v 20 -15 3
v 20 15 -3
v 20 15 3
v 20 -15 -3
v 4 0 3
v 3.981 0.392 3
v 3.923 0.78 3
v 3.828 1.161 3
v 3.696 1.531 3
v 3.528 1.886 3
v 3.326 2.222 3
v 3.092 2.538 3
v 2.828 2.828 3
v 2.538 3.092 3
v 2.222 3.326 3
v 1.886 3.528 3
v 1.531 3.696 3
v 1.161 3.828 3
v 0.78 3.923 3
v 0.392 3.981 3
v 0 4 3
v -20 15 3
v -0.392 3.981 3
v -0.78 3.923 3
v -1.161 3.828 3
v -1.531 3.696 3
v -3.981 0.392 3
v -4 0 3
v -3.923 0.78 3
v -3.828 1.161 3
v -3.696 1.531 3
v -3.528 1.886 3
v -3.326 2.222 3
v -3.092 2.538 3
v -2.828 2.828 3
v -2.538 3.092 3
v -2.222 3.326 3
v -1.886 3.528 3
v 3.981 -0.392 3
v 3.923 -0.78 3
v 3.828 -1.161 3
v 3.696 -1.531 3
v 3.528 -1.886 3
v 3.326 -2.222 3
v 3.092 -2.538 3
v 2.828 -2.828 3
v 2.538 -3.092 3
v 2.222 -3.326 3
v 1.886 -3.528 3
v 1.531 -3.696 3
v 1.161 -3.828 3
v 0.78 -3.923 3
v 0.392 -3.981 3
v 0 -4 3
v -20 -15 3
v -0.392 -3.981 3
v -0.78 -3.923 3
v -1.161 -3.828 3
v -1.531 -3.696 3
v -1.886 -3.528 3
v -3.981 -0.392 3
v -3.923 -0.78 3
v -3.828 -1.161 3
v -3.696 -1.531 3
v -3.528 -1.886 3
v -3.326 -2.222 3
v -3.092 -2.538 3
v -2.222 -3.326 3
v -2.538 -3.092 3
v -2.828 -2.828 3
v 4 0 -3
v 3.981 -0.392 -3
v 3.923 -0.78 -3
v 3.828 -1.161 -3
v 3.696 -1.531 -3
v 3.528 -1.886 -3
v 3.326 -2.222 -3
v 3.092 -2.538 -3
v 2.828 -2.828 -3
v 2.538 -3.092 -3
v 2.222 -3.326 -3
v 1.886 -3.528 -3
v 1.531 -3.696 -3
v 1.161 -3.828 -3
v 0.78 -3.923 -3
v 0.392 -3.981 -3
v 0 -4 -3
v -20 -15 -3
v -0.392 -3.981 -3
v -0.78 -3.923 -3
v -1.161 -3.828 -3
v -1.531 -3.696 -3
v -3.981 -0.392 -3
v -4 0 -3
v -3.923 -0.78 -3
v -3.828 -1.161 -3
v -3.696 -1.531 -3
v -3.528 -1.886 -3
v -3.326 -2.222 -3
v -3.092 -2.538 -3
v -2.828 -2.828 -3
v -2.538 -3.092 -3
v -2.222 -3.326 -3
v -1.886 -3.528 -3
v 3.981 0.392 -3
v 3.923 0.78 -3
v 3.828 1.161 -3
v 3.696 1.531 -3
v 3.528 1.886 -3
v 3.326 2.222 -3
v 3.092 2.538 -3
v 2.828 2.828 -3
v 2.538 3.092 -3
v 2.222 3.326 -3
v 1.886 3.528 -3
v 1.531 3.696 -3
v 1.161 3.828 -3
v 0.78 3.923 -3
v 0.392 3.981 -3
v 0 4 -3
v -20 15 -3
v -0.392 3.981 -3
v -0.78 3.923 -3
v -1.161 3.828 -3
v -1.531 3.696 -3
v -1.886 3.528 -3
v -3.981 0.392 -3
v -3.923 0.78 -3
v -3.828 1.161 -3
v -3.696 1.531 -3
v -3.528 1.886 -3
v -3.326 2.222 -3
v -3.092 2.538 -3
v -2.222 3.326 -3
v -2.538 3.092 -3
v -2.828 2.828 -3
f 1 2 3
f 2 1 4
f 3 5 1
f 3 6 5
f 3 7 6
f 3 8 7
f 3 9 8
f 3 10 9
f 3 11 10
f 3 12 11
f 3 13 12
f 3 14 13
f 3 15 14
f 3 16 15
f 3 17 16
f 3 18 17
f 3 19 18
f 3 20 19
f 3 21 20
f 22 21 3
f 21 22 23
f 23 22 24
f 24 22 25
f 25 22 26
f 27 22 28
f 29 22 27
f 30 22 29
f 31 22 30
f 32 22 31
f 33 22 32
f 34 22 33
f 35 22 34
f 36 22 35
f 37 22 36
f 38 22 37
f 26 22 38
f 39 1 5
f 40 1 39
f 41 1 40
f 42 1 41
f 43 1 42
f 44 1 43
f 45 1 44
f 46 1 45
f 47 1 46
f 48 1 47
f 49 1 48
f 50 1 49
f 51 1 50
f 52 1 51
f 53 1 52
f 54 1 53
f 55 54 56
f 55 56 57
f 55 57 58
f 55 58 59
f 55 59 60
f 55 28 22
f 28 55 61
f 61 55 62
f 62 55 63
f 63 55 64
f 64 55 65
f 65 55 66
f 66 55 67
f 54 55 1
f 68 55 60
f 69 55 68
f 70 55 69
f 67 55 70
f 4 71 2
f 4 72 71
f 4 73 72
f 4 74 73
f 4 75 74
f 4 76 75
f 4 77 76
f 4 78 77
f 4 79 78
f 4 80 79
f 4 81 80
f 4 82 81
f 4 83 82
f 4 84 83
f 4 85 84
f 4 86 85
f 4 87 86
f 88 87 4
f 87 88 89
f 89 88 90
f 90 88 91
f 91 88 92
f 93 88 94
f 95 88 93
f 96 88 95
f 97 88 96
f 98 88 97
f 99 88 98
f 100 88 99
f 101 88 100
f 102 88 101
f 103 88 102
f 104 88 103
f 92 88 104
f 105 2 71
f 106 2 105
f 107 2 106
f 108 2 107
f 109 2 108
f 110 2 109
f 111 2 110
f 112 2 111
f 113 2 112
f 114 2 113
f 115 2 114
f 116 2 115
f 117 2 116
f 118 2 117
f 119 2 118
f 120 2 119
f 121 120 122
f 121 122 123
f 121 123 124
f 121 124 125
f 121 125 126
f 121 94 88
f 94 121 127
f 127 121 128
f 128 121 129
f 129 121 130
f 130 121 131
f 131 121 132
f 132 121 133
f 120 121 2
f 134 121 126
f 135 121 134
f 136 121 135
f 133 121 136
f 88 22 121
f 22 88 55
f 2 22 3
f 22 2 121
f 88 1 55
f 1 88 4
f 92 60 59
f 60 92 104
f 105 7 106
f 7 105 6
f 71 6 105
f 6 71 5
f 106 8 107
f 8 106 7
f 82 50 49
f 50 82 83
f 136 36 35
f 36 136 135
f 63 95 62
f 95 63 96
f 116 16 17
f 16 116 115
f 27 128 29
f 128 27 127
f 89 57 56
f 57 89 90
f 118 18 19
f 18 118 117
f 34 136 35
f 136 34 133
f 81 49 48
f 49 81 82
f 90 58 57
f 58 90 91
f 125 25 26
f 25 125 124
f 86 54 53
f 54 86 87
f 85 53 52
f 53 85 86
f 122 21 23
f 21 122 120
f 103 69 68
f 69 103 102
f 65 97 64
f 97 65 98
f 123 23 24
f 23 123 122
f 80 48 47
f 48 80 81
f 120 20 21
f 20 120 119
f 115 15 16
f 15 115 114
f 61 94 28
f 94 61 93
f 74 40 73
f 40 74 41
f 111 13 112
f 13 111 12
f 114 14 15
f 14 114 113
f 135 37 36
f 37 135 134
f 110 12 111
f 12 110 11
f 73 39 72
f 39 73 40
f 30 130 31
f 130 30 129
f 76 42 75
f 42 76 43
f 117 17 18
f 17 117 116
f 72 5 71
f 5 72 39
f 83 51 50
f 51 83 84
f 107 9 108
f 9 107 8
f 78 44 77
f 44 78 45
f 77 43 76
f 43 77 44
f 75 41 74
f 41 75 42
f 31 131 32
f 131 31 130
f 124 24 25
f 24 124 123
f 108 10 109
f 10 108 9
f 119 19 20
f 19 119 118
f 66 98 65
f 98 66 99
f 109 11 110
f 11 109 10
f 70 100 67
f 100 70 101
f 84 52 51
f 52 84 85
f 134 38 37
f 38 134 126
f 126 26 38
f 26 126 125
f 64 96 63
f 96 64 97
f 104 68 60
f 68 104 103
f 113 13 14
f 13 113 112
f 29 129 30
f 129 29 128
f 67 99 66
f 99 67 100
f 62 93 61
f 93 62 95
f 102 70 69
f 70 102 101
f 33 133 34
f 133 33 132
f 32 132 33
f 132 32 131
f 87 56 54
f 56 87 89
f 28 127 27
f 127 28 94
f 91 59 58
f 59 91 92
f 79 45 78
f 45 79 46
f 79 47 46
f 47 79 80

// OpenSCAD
// A parametric mounting spacer: a plate with a central through-bore.
//
// Deliberately small, self-contained and authored here, so the example carries
// no third-party licensing surface. Real parts live in the dogfood workspace.

plate_x = 40;
plate_y = 30;
plate_z = 6;
bore_d = 8;
wall = 2;
$fn = 64;

difference() {
    cube([plate_x, plate_y, plate_z], center = true);
    cylinder(h = plate_z + 2, d = bore_d, center = true);
}
